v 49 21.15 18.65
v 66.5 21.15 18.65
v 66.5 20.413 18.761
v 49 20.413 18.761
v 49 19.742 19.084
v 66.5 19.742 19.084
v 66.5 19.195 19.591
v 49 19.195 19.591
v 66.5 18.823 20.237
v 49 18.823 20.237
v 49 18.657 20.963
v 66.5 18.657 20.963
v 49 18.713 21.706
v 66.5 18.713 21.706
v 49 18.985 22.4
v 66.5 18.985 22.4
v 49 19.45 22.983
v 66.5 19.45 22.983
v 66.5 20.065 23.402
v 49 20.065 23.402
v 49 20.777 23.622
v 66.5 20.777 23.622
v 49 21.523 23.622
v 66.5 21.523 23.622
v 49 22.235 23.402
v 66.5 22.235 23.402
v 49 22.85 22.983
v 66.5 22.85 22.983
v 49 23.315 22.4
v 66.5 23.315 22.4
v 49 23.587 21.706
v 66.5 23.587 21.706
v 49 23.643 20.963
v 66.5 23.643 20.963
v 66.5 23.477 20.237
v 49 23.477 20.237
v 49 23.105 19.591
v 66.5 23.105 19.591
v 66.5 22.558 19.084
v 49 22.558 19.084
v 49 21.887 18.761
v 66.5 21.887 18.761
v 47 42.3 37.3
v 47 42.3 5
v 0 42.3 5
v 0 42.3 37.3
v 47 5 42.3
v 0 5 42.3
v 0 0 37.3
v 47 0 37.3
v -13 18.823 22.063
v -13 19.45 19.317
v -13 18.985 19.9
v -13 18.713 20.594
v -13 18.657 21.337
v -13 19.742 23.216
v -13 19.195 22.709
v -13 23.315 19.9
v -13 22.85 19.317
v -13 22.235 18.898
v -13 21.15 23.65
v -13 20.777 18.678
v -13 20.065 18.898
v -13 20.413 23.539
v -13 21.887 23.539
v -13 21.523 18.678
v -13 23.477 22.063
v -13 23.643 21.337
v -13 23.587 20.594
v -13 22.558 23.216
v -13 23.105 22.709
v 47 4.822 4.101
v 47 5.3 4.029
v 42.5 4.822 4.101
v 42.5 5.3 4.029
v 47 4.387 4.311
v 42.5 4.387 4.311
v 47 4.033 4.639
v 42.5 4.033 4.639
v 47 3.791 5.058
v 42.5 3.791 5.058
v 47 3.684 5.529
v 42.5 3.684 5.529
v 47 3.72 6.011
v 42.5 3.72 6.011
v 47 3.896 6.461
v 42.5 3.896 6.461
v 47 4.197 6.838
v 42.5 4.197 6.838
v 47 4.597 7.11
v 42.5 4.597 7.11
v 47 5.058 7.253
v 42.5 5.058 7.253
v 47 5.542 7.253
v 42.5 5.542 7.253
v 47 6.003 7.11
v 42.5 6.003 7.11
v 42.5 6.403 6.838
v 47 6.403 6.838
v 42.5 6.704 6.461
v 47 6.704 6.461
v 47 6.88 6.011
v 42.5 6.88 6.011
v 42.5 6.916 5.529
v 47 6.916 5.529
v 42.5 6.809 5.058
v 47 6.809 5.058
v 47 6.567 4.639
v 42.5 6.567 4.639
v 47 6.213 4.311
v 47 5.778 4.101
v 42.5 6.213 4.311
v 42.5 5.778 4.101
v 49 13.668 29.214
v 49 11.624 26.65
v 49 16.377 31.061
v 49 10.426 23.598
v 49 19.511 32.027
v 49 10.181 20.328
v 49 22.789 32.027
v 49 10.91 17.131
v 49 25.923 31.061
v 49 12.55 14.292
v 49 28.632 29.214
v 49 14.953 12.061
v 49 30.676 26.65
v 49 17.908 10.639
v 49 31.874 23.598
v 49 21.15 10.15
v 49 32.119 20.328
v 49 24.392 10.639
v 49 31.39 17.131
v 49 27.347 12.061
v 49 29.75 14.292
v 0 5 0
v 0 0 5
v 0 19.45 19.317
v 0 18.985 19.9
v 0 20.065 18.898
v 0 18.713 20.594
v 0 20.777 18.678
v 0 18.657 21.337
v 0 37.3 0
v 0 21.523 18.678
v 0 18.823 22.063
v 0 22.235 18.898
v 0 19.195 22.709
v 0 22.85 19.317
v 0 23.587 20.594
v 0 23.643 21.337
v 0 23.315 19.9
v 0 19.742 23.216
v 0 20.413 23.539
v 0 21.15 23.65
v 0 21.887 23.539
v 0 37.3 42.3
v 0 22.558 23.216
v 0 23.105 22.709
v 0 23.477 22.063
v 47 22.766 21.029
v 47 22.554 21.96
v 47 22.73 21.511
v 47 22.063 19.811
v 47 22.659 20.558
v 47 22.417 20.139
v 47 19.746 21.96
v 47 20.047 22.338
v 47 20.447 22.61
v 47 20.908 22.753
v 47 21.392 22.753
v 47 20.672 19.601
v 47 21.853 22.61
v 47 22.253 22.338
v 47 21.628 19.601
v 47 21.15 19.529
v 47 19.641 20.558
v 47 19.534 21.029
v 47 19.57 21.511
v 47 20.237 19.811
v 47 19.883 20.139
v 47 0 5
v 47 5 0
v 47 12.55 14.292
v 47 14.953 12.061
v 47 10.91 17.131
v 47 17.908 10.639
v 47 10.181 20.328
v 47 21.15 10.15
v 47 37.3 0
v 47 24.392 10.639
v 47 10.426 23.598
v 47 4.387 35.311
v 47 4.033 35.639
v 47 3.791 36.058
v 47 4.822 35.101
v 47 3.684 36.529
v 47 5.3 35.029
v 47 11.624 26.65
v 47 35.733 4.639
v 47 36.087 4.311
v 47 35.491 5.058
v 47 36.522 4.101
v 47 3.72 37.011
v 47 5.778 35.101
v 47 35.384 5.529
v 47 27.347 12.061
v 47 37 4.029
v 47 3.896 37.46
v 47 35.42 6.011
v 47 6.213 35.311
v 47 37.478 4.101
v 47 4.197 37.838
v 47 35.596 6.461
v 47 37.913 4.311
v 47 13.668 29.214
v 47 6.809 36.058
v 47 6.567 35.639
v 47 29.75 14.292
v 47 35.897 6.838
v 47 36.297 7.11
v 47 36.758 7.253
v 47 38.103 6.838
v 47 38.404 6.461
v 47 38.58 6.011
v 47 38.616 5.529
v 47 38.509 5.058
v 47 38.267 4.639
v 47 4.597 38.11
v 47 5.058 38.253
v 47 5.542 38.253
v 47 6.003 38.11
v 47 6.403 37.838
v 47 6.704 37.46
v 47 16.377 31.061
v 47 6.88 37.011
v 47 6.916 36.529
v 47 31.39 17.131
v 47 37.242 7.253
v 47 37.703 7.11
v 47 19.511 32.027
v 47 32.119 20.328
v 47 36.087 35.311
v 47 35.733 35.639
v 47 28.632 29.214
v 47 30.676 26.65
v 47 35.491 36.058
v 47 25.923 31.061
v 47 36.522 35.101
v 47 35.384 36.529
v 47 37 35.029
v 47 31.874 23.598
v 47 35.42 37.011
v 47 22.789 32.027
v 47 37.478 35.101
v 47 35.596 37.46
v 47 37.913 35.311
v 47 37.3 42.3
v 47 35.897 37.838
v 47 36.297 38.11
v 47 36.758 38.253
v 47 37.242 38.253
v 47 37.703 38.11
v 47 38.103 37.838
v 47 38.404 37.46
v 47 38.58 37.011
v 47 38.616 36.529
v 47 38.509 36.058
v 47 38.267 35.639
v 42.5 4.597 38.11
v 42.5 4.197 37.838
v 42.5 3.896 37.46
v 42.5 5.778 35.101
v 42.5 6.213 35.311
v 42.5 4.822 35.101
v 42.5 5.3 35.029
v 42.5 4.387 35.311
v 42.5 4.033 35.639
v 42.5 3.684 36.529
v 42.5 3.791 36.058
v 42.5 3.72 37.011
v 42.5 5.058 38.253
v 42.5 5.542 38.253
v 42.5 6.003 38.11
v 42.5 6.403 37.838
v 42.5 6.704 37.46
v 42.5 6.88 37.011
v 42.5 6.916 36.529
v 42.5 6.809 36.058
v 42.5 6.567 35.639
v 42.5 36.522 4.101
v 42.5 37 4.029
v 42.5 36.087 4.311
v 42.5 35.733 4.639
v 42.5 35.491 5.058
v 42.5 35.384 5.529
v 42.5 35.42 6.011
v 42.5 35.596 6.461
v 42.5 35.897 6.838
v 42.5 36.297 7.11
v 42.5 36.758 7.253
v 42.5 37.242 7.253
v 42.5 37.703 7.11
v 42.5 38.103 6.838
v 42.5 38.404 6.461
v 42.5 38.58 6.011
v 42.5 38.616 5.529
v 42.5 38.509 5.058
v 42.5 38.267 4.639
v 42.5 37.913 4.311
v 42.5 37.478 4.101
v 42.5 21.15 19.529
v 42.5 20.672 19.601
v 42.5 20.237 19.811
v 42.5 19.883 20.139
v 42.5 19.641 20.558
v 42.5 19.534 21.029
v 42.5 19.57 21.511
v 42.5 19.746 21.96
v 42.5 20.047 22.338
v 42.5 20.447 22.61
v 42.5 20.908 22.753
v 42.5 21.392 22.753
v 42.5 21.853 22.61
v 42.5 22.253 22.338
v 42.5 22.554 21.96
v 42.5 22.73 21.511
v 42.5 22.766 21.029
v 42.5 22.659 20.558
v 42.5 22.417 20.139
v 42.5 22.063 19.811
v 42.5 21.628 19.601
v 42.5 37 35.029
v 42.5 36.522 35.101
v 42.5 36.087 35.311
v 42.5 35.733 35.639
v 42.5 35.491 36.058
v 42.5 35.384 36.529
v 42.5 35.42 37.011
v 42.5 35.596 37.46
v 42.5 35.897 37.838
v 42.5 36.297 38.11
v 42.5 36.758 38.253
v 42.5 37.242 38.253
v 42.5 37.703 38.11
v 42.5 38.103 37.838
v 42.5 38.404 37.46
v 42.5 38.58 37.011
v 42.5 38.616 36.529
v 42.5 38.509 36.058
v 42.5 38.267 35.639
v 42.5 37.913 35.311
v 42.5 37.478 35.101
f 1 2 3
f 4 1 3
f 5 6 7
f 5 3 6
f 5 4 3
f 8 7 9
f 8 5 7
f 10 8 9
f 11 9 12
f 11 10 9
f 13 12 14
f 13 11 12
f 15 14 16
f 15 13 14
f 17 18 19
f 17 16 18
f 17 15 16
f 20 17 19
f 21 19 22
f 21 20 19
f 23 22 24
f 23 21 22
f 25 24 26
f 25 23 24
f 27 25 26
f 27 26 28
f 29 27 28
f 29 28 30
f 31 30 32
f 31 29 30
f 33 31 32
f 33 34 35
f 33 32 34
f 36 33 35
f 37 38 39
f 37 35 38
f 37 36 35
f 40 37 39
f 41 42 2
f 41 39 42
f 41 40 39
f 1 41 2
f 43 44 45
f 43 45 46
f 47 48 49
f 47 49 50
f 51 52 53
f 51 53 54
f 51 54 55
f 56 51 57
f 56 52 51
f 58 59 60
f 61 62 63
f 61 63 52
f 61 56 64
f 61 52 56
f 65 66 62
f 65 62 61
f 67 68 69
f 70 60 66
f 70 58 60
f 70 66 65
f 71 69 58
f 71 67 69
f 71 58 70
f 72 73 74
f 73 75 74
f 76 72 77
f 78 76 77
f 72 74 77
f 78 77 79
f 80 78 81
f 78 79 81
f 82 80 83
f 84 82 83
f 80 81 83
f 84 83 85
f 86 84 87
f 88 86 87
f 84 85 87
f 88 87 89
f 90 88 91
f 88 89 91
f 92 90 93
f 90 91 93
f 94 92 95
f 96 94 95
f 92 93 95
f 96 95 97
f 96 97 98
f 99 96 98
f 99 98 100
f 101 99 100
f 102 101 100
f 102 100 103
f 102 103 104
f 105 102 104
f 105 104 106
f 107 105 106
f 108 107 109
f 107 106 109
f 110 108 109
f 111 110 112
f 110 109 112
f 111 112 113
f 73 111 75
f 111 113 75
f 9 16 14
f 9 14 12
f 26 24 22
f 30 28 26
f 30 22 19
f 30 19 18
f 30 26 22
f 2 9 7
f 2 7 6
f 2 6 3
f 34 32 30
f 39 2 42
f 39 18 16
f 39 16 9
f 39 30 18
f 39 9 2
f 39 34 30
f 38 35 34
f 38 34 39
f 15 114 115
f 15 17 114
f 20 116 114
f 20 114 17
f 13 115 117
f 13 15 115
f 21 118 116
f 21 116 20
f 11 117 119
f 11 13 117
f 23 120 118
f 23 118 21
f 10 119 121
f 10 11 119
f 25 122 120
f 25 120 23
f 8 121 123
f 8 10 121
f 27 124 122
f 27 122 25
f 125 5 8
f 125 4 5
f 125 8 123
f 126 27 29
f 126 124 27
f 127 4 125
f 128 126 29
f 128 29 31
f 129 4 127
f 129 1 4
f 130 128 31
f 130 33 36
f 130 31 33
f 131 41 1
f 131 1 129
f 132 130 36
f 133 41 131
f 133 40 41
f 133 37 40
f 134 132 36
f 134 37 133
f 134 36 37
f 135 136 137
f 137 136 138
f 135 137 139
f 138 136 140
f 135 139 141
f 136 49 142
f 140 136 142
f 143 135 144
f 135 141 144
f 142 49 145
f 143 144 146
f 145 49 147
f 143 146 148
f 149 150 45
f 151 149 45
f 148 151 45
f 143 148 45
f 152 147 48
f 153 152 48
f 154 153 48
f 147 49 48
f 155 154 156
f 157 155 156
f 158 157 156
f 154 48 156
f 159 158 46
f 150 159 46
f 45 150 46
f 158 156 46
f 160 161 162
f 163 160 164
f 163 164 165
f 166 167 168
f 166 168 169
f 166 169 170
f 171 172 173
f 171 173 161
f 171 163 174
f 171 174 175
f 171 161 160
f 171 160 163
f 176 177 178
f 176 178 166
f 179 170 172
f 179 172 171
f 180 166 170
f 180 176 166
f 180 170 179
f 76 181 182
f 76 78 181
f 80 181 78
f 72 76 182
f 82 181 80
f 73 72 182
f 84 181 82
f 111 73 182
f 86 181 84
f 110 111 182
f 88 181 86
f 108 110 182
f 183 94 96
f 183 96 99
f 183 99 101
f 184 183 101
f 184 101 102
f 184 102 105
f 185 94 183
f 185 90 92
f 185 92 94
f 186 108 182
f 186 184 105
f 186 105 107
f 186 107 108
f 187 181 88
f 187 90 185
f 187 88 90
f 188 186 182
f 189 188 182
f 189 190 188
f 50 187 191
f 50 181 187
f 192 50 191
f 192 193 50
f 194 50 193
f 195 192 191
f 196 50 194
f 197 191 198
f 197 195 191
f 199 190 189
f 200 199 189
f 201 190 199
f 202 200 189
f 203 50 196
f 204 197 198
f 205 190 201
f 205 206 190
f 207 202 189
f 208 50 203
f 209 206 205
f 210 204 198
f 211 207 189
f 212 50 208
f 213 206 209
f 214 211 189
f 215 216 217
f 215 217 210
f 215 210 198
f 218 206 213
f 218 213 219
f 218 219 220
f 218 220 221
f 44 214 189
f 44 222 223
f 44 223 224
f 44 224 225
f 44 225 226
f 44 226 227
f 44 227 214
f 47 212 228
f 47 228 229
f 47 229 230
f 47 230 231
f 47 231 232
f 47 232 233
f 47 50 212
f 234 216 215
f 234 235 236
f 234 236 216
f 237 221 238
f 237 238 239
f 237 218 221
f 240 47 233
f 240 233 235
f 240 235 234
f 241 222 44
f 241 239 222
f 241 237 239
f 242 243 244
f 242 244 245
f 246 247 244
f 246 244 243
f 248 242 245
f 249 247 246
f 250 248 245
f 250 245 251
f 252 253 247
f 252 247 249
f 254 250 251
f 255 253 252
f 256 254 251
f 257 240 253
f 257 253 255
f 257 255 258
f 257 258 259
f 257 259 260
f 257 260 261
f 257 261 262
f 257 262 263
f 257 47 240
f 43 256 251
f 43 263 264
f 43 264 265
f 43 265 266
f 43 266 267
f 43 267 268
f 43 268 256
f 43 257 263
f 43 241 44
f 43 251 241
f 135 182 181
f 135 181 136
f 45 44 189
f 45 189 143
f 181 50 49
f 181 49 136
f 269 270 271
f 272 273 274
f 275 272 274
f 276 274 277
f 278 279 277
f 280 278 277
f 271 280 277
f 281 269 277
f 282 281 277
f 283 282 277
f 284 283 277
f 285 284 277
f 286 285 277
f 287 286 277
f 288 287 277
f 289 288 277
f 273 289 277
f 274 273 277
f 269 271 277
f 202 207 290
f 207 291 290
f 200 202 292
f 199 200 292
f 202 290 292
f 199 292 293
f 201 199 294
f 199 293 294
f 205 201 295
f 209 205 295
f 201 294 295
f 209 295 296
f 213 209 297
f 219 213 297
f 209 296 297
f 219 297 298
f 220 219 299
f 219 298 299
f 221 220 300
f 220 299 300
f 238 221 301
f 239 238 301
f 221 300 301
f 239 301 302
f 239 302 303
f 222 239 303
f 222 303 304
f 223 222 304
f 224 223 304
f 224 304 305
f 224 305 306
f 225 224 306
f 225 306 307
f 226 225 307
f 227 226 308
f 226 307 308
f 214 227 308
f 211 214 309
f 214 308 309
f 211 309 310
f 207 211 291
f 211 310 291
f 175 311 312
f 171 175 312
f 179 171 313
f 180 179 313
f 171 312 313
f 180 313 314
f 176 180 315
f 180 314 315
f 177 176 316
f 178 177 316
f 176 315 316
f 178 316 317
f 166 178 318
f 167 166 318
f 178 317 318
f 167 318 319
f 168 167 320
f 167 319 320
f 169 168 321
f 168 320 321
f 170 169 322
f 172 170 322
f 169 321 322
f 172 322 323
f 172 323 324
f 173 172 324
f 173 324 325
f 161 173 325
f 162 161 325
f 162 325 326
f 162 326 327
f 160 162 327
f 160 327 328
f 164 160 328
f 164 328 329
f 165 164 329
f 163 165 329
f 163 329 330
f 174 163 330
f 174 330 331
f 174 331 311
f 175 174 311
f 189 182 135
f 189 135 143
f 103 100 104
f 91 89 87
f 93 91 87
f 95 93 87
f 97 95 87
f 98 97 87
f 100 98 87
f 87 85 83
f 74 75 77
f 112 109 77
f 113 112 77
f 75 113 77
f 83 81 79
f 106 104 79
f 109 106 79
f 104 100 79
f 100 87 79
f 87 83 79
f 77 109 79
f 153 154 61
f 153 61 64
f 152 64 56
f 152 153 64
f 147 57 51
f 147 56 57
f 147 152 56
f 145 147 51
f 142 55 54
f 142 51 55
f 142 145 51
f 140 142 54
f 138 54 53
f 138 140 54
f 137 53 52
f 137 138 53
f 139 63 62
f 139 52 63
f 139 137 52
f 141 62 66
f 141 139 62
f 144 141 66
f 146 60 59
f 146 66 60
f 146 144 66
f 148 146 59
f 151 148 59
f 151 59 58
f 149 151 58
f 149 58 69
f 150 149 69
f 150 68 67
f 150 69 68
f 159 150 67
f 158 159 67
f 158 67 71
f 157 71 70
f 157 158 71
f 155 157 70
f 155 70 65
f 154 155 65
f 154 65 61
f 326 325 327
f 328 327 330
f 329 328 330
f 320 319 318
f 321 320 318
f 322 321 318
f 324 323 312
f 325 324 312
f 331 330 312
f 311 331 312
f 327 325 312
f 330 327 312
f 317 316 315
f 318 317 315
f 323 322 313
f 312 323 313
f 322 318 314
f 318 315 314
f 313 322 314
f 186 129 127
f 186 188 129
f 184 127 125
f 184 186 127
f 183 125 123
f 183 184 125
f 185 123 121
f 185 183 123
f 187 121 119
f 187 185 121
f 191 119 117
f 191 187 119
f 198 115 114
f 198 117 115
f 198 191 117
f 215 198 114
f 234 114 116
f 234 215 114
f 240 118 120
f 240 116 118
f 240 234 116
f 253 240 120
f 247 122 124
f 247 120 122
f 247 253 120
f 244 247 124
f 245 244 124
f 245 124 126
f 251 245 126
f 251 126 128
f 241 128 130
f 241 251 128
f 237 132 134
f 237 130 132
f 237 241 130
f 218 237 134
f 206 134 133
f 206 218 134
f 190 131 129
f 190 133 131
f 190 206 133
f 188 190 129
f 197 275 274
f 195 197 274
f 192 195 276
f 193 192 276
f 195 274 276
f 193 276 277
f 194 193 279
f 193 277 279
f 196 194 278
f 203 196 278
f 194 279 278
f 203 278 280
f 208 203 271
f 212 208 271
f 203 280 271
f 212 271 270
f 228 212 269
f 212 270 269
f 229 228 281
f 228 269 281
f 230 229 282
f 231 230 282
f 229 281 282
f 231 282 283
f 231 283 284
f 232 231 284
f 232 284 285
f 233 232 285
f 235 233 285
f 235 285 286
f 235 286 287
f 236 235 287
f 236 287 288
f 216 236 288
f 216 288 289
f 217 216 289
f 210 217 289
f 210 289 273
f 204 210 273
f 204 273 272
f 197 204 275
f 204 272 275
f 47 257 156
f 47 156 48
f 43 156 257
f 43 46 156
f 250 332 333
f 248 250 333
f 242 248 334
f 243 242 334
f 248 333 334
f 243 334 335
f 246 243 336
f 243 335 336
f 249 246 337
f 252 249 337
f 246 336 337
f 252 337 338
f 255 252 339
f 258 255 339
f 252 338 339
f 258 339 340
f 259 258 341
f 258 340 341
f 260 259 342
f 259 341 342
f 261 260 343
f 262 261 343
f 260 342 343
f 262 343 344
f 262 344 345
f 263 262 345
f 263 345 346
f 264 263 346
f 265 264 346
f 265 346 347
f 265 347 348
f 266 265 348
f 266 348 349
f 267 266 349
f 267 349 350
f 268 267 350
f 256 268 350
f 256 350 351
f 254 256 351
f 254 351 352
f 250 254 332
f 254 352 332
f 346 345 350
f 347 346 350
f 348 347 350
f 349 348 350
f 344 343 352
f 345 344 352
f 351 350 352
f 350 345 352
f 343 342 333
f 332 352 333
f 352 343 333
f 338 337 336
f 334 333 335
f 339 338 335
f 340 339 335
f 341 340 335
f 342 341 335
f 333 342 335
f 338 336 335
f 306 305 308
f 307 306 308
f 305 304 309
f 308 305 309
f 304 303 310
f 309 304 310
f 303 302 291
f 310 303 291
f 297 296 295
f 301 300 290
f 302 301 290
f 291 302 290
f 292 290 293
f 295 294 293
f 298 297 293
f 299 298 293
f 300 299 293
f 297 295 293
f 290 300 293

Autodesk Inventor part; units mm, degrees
ref_plane "YZ Plane" through (0, 0, 0) normal (1, 0, 0) x (0, 1, 0)
ref_plane "XZ Plane" through (0, 0, 0) normal (0, 1, 0) x (-1, 0, 0)
ref_plane "XY Plane" through (0, 0, 0) normal (0, 0, 1) x (1, 0, 0)
sketch "Sketch1" plane through (0, 0, 0) normal (1, 0, 0) x (0, 1, 0)
  line L0 (0, 0) -> (42.3, 0)
  line L1 (42.3, 0) -> (42.3, 42.3)
  line L2 (42.3, 42.3) -> (0, 42.3)
  line L3 (0, 42.3) -> (0, 0)
  dimension "d0" = 42.3
  dimension "d1" = 42.3
extrude "Extrusion1" add sketch "Sketch1" along normal blind 47
sketch "Sketch2" plane through (47, 0, 0) normal (1, 0, 0) x (0, 0, -1)
  circle A0 centre (-21.15, 21.15) radius 11
  dimension "d4" = 22
extrude "Extrusion2" add sketch "Sketch2" along normal blind 2
sketch "Sketch3" plane through (47, 0, 0) normal (1, 0, 0) x (0, 0, -1)
  line L0 (-36.65, 5.3) -> (-5.65, 37) construction
  line L1 (-5.65, 5.3) -> (-36.65, 37) construction
  point P0 (-21.15, 21.15)
  point P1 (-21.15, 21.15)
  point P2 (-21.15, 21.15)
  dimension "d7" = 31
hole "Hole1" at (47, 21.15, 21.15) at (47, 37, 36.65) at (47, 37, 5.65) at (47, 5.3, 5.65) at (47, 5.3, 36.65) direction (-1, 0, 0) diameter 3.242 depth 4.5 thread size "M4x0.7" class "6H" standard "ANSI Metric M Profile"
chamfer "Chamfer1" distance 5 angle 45 4 edges at (23.5, 42.3, 42.3) (23.5, 42.3, 0) (23.5, 0, 42.3) (23.5, 0, 0)
sketch "Sketch4" plane through (49, 21.15, 21.15) normal (1, 0, 0) x (0, 0, -1)
  circle A0 centre (0, 0) radius 11 projected
  circle A1 centre (0, 0) radius 2.5
  point P0 (21.15, -21.15)
  dimension "d18" = 5
extrude "Extrusion3" add sketch "Sketch4" along normal blind 17.5 contours A1
sketch "Sketch5" plane through (0, 0, 0) normal (-1, 0, 0) x (0, 0, 1)
  circle A0 centre (21.15, 21.15) radius 2.5
  point P0 (0, 0)
  dimension "d21" = 5
extrude "Extrusion4" add sketch "Sketch5" along normal blind 13
properties part number "NEMA17-dual-shaft"
